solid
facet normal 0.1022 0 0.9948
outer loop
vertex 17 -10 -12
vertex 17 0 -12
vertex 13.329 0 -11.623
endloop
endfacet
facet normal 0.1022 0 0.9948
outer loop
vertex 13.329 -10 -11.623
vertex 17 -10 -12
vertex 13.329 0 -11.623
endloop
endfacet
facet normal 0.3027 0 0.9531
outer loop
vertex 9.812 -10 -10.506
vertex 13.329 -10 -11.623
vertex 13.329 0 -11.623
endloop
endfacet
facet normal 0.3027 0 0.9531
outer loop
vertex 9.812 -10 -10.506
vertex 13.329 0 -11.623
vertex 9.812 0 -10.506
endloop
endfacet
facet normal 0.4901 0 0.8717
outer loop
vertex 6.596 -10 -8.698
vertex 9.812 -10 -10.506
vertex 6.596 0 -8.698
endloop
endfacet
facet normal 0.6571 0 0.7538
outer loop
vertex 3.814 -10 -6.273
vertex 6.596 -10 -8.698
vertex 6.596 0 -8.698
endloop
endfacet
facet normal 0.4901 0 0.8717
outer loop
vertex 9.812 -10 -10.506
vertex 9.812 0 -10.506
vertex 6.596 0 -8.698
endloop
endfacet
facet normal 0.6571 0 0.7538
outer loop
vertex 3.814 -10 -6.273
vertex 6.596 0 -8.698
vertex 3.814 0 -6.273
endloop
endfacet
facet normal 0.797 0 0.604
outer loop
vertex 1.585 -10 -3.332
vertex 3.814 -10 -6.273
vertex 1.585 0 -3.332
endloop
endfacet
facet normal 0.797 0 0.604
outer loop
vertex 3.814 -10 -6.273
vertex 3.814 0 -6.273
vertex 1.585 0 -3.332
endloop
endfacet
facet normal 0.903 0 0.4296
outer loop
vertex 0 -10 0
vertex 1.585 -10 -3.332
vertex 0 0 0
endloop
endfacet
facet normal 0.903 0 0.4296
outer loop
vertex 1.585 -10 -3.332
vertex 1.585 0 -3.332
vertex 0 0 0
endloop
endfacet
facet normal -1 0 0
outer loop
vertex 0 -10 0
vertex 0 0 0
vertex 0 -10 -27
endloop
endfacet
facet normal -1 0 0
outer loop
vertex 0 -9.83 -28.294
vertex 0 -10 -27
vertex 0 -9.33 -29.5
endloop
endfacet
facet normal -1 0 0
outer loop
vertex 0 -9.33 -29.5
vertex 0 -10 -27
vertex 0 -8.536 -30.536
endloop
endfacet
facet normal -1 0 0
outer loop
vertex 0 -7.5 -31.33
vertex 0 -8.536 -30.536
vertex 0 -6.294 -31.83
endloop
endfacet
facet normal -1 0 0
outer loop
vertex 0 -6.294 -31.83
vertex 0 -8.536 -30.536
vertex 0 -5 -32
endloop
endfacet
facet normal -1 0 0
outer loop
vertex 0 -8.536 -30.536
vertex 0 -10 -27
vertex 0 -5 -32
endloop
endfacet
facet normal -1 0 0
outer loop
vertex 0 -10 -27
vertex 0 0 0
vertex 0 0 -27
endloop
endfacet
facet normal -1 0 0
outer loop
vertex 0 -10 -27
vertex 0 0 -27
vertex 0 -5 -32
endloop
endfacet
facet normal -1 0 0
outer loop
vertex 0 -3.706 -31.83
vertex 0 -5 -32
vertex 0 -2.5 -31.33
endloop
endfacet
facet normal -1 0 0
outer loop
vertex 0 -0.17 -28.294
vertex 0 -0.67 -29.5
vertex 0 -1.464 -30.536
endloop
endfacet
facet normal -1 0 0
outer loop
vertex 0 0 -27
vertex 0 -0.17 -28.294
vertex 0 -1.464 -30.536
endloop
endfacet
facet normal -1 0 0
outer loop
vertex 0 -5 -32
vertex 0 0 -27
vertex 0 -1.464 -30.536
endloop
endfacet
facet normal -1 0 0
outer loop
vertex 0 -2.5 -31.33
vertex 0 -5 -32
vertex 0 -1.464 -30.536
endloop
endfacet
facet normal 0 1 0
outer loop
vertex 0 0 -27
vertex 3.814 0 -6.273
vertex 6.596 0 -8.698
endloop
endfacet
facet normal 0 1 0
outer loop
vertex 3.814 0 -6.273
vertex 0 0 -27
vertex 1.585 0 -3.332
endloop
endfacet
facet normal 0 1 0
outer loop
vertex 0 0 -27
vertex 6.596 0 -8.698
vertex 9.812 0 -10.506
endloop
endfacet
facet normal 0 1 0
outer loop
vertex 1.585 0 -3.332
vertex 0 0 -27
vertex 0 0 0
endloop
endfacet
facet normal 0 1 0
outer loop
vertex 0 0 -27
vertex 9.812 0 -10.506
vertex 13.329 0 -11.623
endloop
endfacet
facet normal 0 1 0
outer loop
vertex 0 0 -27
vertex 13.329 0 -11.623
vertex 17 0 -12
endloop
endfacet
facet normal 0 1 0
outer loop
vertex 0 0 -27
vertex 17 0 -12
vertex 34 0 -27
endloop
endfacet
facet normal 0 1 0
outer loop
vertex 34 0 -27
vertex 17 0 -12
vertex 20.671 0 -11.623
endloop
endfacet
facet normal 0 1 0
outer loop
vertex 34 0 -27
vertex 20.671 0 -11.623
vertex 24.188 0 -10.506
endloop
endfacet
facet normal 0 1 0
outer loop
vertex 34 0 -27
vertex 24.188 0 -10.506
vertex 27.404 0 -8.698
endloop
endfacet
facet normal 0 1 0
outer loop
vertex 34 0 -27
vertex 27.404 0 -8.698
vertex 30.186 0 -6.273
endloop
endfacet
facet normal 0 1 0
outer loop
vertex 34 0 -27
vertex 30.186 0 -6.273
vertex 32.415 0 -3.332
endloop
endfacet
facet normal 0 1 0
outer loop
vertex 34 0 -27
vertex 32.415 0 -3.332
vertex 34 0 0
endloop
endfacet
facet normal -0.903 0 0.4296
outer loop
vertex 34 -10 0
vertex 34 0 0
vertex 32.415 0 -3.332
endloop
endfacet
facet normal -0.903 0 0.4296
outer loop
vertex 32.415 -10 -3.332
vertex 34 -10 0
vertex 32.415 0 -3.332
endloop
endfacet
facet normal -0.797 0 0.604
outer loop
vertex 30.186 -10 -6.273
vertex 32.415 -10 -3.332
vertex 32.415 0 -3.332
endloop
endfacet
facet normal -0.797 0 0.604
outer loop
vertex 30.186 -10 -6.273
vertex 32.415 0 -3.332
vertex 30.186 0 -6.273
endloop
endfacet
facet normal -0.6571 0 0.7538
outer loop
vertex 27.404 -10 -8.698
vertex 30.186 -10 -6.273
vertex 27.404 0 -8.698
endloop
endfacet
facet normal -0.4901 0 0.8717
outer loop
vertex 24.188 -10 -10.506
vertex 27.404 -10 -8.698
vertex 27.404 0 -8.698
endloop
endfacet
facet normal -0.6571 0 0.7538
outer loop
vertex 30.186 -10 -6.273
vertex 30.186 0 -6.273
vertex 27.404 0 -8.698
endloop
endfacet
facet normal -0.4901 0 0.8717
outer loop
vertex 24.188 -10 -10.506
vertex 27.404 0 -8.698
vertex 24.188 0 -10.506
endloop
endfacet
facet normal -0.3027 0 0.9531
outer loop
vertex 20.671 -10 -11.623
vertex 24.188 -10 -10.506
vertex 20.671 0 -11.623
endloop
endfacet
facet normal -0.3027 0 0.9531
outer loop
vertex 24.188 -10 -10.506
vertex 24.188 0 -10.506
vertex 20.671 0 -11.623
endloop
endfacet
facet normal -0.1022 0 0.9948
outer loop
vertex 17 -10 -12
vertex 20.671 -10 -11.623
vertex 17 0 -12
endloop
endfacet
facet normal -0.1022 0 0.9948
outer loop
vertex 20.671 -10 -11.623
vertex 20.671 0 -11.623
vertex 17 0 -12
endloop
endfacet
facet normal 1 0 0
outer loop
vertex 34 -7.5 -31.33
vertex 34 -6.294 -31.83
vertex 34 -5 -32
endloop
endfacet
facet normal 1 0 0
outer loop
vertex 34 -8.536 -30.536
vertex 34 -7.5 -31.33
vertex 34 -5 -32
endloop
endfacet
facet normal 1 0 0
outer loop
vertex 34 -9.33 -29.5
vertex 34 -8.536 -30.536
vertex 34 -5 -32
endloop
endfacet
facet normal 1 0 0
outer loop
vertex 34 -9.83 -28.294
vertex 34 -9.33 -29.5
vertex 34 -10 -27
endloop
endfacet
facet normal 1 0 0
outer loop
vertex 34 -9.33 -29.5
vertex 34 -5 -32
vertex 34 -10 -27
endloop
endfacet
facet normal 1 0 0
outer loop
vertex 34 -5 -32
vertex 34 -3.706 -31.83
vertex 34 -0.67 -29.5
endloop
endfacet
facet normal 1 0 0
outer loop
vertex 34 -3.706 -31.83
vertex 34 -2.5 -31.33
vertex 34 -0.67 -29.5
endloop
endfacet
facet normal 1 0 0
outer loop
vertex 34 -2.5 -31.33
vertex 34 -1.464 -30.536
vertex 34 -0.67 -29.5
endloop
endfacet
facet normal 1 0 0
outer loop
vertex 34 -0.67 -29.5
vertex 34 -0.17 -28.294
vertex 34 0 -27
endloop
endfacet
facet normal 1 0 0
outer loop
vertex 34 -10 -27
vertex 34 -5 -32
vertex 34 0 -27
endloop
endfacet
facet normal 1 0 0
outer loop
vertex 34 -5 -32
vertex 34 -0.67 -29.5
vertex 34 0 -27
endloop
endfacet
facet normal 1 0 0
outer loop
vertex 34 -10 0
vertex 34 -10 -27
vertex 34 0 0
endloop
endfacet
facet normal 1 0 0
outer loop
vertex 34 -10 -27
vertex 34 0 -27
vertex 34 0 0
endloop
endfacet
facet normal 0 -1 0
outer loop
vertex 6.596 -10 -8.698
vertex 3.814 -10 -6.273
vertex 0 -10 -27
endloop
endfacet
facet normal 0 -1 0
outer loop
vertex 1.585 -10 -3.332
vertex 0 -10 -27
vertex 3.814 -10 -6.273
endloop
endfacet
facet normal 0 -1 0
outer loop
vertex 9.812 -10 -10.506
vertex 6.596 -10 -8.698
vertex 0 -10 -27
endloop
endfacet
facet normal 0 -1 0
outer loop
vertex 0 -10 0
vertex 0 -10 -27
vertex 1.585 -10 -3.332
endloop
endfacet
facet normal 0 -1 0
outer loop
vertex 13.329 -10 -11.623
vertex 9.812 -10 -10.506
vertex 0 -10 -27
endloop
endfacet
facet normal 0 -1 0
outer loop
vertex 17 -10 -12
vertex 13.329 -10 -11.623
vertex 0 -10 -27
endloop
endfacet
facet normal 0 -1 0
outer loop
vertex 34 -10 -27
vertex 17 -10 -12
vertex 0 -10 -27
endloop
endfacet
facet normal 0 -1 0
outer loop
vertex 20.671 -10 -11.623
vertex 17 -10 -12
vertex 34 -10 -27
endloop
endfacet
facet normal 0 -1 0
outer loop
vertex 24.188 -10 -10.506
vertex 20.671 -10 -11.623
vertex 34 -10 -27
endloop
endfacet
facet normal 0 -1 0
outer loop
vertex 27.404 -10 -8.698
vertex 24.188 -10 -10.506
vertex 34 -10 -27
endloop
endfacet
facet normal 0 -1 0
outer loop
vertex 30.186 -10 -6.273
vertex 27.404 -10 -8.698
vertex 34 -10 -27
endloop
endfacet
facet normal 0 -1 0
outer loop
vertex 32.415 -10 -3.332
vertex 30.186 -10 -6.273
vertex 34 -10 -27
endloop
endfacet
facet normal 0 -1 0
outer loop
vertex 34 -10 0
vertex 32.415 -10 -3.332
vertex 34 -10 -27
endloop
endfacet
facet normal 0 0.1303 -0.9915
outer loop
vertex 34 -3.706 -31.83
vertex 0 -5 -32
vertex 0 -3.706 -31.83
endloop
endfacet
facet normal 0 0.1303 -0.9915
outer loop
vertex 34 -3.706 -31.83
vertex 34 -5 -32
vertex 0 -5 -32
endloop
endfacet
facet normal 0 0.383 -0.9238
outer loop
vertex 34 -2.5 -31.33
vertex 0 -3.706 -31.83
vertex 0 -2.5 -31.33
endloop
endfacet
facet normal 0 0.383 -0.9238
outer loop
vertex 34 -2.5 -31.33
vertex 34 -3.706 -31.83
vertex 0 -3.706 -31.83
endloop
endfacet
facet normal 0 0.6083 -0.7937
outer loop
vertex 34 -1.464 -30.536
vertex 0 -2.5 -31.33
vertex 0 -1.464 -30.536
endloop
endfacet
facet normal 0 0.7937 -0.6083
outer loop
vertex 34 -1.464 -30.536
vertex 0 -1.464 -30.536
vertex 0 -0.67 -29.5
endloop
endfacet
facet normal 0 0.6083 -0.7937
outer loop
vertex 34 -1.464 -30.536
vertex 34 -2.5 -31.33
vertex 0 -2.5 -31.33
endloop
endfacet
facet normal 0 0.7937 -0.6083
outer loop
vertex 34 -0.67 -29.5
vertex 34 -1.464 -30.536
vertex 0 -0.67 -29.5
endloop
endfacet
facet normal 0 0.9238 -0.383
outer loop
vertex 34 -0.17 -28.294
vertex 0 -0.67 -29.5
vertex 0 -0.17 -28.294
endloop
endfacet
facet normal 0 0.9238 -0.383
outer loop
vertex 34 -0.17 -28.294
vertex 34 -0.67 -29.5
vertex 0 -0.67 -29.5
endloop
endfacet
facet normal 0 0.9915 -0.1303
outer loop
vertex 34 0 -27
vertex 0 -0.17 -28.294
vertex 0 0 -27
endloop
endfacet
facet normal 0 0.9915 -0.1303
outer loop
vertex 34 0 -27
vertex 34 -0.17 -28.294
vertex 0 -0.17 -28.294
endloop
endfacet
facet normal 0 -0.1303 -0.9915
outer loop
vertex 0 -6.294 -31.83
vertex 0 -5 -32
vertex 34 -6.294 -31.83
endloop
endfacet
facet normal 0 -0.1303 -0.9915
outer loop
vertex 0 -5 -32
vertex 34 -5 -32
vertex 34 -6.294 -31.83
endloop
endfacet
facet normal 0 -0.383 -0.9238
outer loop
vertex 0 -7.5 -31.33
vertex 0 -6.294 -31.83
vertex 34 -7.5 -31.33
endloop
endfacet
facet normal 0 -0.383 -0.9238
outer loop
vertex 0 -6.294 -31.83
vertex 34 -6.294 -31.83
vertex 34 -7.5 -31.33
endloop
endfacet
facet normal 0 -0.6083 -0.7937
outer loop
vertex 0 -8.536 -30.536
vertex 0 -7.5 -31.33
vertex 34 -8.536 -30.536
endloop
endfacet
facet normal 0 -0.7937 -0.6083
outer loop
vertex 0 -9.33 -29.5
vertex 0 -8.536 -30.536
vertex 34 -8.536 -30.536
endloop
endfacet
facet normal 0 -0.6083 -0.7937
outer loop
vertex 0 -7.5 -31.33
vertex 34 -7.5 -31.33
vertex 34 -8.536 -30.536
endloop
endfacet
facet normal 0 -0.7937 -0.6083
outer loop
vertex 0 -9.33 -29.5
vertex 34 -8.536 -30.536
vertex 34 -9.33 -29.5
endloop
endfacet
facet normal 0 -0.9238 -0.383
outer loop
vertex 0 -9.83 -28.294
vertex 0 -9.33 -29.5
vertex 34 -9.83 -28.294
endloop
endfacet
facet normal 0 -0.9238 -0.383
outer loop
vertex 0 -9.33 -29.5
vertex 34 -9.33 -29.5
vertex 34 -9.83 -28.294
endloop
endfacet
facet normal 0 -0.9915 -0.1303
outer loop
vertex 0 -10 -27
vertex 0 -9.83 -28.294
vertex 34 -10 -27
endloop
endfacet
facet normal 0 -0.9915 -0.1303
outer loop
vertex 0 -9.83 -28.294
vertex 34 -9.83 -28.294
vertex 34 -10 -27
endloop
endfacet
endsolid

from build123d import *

# Parameters (mm, degrees)
F1_DEPTH = 10
F2_R     = 4.99999


# Not quite as in the source:
# - a fillet or chamfer is up to 0.001 mm smaller than in the source, because OpenCascade refuses the exact size


with BuildPart() as f1:
    # F0 (on Front) → F1 (new body)
    with BuildSketch(Plane.XZ):
        with BuildLine():
            Line((34, -32), (34, 0))
            ThreePointArc((34, 0), (27.4043260233, -8.6977951997), (17, -12))
            ThreePointArc((17, -12), (6.5956739767, -8.6977951997), (0, 0))
            Line((0, 0), (0, -5))
            Line((0, -5), (0, -32))
            Line((0, -32), (34, -32))
        make_face()
    extrude(amount=F1_DEPTH)

    # F2 (radius 5 in the source; OpenCascade refuses exactly that, so slightly less here)
    f2_edges = [f1.edges().sort_by_distance(p)[0] for p in [
        (17, 0, -32),
        (17, -10, -32),
    ]]
    fillet(f2_edges, radius=F2_R)


solid = f1.part
